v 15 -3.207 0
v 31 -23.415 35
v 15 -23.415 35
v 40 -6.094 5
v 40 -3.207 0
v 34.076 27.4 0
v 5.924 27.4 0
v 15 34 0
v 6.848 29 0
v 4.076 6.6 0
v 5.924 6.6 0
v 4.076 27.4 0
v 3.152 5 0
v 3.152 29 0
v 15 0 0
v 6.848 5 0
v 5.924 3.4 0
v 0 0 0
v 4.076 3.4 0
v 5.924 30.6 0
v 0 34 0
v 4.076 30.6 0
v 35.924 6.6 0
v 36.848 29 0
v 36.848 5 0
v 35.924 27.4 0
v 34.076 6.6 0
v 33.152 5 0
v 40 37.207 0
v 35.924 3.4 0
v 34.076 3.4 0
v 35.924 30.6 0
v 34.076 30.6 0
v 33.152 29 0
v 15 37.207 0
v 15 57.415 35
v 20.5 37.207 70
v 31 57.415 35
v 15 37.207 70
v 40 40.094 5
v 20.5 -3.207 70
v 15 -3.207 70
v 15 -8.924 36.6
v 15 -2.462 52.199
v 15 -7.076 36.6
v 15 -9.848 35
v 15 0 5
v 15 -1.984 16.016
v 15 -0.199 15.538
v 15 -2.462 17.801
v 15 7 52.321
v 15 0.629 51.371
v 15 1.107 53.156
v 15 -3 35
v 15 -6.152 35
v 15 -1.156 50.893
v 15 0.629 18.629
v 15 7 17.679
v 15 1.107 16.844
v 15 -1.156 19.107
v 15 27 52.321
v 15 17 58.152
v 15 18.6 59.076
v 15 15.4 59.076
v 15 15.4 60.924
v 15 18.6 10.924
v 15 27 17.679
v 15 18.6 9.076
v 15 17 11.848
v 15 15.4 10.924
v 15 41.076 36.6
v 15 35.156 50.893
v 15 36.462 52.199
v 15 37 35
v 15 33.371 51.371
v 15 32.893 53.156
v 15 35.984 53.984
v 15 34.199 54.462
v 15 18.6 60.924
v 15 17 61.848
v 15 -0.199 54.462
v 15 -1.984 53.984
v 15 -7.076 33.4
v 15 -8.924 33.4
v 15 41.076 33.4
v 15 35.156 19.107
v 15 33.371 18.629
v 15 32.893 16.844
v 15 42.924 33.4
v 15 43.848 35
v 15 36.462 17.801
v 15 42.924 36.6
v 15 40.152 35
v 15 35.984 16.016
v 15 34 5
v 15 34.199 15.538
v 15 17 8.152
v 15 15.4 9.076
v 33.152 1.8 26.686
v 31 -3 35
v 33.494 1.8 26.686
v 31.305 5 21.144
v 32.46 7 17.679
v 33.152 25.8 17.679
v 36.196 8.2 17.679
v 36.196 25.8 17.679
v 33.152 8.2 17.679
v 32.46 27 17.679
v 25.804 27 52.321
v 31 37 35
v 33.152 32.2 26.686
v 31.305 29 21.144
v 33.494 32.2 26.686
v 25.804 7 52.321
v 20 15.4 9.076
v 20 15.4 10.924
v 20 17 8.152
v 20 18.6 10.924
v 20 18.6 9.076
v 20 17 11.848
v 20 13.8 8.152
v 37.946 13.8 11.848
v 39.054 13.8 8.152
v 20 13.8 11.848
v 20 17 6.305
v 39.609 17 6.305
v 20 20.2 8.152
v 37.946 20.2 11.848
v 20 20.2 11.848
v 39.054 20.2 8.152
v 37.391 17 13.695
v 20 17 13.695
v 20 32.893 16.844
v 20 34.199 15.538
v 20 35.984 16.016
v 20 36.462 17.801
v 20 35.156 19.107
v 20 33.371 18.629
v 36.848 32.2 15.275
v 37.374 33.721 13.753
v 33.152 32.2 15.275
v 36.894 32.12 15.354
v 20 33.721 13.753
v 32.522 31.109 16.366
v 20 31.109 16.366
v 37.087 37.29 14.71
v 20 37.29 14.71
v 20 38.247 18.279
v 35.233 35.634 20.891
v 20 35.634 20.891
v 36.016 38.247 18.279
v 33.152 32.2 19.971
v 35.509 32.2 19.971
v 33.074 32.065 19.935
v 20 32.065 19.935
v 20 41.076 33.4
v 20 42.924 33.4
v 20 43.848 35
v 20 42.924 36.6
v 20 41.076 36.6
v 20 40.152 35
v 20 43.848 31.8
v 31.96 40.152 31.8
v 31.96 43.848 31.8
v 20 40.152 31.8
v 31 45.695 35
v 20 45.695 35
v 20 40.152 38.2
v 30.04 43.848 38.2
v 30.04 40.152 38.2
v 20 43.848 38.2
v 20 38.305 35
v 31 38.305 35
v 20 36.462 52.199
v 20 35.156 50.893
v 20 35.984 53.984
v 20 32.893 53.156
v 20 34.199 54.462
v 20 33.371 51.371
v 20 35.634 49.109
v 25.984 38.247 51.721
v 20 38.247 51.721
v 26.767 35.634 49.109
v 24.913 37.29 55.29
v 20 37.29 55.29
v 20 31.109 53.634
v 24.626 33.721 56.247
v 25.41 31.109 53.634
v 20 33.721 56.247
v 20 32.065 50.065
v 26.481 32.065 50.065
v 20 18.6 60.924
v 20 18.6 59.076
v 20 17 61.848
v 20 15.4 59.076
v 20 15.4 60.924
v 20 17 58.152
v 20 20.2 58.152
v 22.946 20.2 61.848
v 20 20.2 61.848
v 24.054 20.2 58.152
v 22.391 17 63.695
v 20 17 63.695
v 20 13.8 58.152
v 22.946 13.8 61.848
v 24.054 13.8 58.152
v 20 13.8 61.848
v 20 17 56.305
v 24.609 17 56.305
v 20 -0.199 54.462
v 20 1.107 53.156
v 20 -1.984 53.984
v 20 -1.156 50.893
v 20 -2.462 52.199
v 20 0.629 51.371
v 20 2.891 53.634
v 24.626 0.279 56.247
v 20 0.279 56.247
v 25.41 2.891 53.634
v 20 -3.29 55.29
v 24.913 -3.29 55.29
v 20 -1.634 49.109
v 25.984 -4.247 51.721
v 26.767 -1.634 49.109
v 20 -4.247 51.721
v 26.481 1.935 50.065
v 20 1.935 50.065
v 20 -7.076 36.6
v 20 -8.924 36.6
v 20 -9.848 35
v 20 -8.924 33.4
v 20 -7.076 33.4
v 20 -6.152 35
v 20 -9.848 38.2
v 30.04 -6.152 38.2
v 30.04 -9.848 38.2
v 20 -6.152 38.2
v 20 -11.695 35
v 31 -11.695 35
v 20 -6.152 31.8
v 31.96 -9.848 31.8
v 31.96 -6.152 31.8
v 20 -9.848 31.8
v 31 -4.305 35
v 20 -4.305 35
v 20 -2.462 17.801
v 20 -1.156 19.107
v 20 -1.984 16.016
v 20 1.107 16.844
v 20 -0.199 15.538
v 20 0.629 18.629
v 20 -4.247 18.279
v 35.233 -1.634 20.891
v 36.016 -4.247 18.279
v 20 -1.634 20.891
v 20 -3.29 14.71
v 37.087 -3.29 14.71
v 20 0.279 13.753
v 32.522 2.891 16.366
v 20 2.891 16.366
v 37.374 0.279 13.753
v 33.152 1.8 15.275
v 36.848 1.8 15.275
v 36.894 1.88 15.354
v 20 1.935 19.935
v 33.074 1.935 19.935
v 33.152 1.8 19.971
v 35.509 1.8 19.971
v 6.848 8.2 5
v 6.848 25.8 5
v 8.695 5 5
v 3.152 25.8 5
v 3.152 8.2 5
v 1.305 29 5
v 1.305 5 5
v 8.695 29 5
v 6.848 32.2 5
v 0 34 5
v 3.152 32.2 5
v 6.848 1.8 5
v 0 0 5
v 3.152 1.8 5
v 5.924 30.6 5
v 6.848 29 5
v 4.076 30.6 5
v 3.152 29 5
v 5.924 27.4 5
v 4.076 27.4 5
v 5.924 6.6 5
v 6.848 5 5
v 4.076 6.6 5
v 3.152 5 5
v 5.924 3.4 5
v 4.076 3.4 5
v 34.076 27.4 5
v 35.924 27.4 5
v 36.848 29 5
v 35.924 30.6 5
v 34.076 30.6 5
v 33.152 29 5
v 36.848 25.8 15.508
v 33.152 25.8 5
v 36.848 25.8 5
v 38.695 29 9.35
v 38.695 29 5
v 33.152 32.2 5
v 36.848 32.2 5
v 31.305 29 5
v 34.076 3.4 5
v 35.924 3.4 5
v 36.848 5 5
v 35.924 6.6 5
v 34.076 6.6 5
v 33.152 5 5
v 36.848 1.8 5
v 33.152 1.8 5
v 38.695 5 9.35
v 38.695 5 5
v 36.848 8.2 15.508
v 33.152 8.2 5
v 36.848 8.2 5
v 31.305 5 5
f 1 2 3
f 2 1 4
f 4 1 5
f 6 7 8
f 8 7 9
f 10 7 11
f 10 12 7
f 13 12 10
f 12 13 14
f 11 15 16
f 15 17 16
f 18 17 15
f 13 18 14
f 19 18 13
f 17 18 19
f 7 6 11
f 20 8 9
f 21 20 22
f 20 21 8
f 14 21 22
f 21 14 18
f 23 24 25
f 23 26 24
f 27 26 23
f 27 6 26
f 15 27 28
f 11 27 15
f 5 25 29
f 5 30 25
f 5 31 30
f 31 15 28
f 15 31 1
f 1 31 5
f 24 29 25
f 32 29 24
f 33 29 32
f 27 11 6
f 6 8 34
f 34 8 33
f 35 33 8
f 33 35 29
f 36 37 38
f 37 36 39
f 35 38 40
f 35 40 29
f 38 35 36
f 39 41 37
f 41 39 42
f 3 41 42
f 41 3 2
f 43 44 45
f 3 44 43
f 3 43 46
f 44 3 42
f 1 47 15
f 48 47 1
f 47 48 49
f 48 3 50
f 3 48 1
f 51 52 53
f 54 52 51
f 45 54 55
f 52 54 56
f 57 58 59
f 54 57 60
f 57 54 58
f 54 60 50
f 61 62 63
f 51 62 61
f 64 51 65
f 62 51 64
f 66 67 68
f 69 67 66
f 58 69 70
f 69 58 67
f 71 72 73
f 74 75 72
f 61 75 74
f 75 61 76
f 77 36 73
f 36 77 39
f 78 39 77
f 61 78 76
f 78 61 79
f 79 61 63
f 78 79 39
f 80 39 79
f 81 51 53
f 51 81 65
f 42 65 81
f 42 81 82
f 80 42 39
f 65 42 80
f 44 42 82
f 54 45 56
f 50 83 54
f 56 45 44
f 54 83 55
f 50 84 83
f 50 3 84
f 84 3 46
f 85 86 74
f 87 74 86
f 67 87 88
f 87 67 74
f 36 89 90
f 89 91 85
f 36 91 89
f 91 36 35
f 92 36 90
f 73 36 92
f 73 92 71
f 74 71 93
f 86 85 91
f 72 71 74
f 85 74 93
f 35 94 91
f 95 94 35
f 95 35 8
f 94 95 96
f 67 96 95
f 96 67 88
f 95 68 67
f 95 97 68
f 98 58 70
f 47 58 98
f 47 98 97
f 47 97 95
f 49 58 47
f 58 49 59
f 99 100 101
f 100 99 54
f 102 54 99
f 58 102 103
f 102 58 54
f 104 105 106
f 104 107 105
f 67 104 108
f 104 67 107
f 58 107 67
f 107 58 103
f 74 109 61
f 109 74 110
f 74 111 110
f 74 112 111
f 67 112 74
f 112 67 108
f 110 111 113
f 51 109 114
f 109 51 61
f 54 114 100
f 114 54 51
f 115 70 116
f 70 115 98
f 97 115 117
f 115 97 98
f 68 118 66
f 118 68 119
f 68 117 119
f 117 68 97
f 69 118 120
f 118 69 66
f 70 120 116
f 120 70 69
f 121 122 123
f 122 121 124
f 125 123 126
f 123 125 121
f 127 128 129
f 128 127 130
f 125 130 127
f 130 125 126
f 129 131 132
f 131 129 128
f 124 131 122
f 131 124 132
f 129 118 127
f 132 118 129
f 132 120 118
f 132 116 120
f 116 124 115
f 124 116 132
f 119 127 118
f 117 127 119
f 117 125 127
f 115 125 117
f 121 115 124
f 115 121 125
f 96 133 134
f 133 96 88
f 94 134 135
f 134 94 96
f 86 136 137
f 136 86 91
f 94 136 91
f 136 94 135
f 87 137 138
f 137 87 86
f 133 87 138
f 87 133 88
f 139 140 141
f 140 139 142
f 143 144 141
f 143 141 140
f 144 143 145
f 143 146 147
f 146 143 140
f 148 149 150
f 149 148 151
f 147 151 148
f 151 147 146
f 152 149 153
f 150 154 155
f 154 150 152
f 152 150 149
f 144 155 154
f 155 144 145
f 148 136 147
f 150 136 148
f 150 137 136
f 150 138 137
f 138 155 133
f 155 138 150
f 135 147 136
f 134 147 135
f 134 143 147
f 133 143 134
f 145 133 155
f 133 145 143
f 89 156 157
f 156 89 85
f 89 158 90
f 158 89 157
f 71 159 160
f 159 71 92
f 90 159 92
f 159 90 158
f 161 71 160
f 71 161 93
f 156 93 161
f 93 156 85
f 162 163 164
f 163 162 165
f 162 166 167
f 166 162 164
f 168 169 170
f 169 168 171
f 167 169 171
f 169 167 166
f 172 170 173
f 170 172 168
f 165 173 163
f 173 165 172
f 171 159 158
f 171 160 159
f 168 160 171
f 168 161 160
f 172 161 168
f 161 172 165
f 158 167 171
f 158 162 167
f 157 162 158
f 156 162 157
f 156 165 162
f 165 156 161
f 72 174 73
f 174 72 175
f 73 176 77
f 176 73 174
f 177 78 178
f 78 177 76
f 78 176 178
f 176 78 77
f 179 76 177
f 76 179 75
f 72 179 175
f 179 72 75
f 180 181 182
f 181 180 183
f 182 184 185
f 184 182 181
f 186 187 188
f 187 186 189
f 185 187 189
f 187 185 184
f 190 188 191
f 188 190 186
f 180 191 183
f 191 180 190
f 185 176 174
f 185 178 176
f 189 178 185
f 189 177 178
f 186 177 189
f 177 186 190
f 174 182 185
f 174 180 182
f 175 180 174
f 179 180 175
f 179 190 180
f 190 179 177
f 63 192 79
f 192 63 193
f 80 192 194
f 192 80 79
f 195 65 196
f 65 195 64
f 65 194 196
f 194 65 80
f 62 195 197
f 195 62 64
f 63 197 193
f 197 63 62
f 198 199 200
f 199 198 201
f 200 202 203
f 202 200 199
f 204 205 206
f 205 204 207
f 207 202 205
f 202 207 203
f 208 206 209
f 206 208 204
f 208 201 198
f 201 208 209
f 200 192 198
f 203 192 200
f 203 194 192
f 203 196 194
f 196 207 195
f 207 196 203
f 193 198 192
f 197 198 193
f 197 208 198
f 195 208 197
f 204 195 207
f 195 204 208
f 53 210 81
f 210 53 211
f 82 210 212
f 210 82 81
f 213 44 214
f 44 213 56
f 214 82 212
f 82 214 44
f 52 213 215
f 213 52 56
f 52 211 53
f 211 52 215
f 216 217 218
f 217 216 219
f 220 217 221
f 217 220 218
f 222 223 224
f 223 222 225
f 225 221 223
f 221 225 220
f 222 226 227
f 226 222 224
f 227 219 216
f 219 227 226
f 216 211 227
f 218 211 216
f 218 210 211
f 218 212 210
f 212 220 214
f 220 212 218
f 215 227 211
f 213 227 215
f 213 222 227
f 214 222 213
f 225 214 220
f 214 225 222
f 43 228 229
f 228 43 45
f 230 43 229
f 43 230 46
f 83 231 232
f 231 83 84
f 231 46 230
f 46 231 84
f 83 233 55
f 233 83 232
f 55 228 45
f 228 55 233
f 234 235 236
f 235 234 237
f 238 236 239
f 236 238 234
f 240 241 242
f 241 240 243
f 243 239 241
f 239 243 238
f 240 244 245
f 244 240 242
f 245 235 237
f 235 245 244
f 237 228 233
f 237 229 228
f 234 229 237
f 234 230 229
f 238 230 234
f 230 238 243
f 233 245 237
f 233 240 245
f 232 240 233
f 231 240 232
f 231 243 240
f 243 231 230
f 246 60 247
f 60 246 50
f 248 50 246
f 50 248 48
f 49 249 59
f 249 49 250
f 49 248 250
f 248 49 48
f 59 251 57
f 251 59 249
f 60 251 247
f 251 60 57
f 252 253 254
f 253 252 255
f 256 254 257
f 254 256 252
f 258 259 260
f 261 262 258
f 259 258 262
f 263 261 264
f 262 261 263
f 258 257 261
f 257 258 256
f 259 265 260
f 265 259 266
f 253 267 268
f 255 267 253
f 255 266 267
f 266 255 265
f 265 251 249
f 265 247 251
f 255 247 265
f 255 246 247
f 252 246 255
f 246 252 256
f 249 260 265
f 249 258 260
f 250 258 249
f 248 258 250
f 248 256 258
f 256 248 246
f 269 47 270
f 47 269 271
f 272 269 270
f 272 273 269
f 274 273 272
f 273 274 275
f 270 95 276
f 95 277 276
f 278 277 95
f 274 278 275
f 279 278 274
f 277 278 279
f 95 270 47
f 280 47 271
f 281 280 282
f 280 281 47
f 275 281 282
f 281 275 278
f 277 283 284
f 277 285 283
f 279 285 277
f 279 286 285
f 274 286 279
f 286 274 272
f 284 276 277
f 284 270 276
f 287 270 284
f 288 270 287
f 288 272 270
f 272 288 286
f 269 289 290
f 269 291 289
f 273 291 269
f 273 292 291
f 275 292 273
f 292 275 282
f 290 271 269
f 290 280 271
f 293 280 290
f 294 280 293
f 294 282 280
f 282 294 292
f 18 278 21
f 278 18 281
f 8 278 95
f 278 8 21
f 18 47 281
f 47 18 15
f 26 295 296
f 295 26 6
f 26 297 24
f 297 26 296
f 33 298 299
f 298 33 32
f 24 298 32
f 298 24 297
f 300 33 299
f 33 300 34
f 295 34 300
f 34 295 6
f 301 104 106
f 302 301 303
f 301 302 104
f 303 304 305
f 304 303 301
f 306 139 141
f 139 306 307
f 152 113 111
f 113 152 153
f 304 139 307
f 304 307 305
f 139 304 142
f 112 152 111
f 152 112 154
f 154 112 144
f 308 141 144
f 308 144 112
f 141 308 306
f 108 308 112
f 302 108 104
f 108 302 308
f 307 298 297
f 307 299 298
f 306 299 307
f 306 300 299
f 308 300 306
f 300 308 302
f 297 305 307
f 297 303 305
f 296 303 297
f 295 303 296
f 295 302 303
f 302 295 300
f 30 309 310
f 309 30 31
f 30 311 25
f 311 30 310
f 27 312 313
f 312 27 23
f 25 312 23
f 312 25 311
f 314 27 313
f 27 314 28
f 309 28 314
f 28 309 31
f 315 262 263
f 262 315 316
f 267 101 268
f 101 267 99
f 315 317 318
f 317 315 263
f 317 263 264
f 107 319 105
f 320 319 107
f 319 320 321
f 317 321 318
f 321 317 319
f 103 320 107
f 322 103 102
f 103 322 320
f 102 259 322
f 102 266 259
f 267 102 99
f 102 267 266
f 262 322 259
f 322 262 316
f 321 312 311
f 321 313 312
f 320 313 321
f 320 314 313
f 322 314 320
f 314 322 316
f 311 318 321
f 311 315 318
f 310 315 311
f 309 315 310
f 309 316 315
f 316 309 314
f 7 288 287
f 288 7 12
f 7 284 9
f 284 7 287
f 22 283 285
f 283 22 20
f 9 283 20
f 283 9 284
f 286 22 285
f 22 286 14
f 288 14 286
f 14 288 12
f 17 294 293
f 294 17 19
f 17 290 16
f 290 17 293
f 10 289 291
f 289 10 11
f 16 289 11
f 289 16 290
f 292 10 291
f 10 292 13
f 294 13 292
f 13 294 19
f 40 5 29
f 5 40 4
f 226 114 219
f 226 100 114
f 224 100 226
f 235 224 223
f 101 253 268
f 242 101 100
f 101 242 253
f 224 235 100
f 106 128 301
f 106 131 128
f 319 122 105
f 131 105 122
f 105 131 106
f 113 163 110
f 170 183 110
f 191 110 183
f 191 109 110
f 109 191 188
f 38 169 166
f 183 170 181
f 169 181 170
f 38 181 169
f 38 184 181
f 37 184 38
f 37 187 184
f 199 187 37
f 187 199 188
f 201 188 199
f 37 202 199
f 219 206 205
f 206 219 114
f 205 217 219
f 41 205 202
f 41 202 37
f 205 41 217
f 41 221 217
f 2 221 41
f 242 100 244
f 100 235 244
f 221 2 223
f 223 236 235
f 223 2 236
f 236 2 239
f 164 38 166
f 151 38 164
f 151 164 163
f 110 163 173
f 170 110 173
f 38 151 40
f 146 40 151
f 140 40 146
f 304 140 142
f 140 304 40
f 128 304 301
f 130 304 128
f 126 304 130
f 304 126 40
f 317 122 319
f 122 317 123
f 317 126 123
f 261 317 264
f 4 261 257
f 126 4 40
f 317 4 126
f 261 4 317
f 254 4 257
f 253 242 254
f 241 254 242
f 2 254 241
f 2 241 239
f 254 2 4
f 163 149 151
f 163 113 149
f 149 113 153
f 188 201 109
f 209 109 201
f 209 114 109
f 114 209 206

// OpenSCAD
// file: vars.scad
huge=500;

printer_w = 400;
printer_l = 400;
printer_h = 400;

bearing_w = 7;
bearing_d = 22;
bearing_r = bearing_d/2;
bearing_hole_d = 8;
bearing_hole_r = bearing_hole_d/2;


misc_bolt_d = 3.2;
misc_bolt_r = misc_bolt_d/2;
misc_nut_r  = misc_bolt_d;
misc_bolt_pitch = 0.5;
misc_bolthead_d = misc_bolt_d*2;
misc_bolthead_r = misc_bolthead_d/2;

retainer_shell_thick = 0.5;
retainer_shell_sep   = 0.25;
//retainer_lip_thick   = 1;
retainer_lip_thick   = 2;
retainer_inner_width = 1;

belt_w    = 6;
belt_thick= 2;
belt_sep  = retainer_lip_thick*2 + 2;

calc_retainer_h  = retainer_lip_thick*2 + belt_w;
calc_retainer_ir = bearing_r + retainer_shell_thick*2 + retainer_shell_sep;
calc_retainer_or = calc_retainer_ir + belt_thick;
calc_retainer_b_off = retainer_lip_thick - (bearing_w-belt_w)/2;

tslot_w = 20;
tslot_bolt_d = 5;
tslot_bolt_r = tslot_bolt_d/2;
tslot_bolt_l = 4;
tslot_bolthead_d = 10;
tslot_bolthead_r = tslot_bolthead_d/2;


corner_thick = 5;
corner_length = tslot_w*3;

rod_d=8;
rod_r=rod_d/2;

bushing_d=16;
bushing_r=bushing_d/2;
bushing_l=10;
bushing_flange_r = bushing_r+3;
bushing_flange_w = 1;
bushing_material_thick = 5;

x_rod_sep = 30;
x_carriage_l = 40;
x_mount_sep_x = x_carriage_l - misc_bolthead_r*2*2 - misc_bolt_r*2;
x_mount_offset = bushing_r + misc_bolt_r * 2;
belt_above_x = 30;
belt_clamp_w = 7;
x_rod_past_bearing = 20;

bearing_mount_base = corner_thick;
bearing_mount_extra = 2;
belt_above_bearing_mount = bearing_mount_base + bearing_mount_extra + retainer_lip_thick;
bearing_mount_support_tweak = 30;

y_bearing_offset = bushing_r+bushing_material_thick-calc_retainer_ir;

y_bearing_sep_y = calc_retainer_ir*2+belt_thick;
y_bearing_sep_z = belt_w+belt_sep;
bearing_bolt_r  = 4;
bearing_bolt_pitch = 1.25;
bearing_bolt_holder_thick = 4;
y_carriage_from_tslot = 2;

motor_w = 42.3;
motor_h = motor_w;
motor_bolt_sep = 31.0;
motor_bolt_r   = 1.5;
motor_pulley_d = 10;
motor_pulley_r = motor_pulley_d/2;
motor_pulley_h = 5.3;
motor_flange_d = 23;
motor_flange_r = motor_flange_d/2;
motor_corner_extra_hole_pos = tslot_bolt_r+3;

calc_corner_from_y_rod = x_rod_past_bearing+corner_thick+y_carriage_from_tslot+tslot_w;
calc_corner_above_x = belt_above_x - belt_above_bearing_mount + bearing_mount_base;

calc_motor1_above_x  = belt_above_x - motor_pulley_h;
calc_motor2_above_x  = belt_above_x - motor_pulley_h + belt_w + belt_sep;
calc_motor_from_y_rod = -bushing_r - bushing_material_thick + bearing_bolt_holder_thick + bearing_bolt_r + calc_retainer_or + motor_pulley_r;

motor_bracket_thick = 12;
motor_bracket_wide = (motor_w - motor_flange_d) / 2;
motor_bracket_len  = motor_w;
motor_bolt_offset  = (motor_w - motor_bolt_sep) / 2;

z_rod_sep = 150;
z_motor_off = motor_h - tslot_w - corner_thick;

laser_mat_thick = 4.75;
laser_mat_margin = laser_mat_thick;
bed_mount_sep   = 209;
bed_from_z      = 60;
bed_box_r       = 25;
bed_box_h       = 50;
platform_l      =  laser_mat_margin + laser_mat_thick + bed_box_r + bed_from_z + bed_mount_sep + misc_bolt_r + laser_mat_margin;
platform_w      = bed_mount_sep + misc_bolt_r*2 + laser_mat_margin*2;
z_leadscrew_passthrough_r = 12/2;
leadscrew_bolt_offset = 22/2;
leadscrew_bolt_r = 3.2/2;
laser_bushing_fudge = 0.1;

lm8uu_d=15;
lm8uu_r=lm8uu_d/2;
lm8uu_bolt_r=5/2;
lm8uu_nut_r=10/2;
// file: common.scad
include <vars.scad>

// Reduce radius of holes intended to hold bolts by threads.
// 0.86603 * p = nominal depth of threads.  1/3-1/2 of that is about right.
function smallhole(r,p) = r - ((p*0.86603)/3);
module polyhole(r,h,v=6,a=0)
{
  rotate([0,0,a]) cylinder( h = h, r = r  / cos( 180 / v ), $fn = v );
}
module polycircle(r,v=6,a=0)
{
  rotate([0,0,a]) circle(r = r  / cos( 180 / v ), $fn = v );
}

module bolt(bolt_r = misc_bolt_r,bolthead_r = misc_bolthead_r,bolt_len = huge,v=6,a=0)
{
  translate([0,0,-bolt_len]) polyhole(r=bolt_r,h=bolt_len+1,v=v,a=a);
  polyhole(r=bolthead_r,h=huge,v=v,a=a);
}

module ring(inner=5,outer=10,v=32)
{
  difference()
  {
    circle(r=outer);
    polycircle(r=inner,v=v);
  }
} 

module roundsquare(dim=[50,50],r=5)
{
  translate([0,r]) square([dim[0], dim[1] - r*2]);
  translate([r,0]) square([dim[0] - r*2, dim[1]]);
  for(x=[r,dim[0]-r])
  for(y=[r,dim[1]-r])
    translate([x,y]) circle(r=r);
}

module maketabs(l=100,w=5,num=10)
{
  tablength=l/(num * 2);
  for(x=[tablength/2:tablength*2:l])
    translate([x,0]) square([tablength,w]);
}
// main file
include <common.scad>

extruder_standard();

module mount()
{
  difference()
  {
    difference()
    {
      polyhole(r=25+corner_thick*2,h=huge,a=360/12);
      translate([0,0,-1]) rotate([0,0,360/12]) cylinder(r=25-corner_thick,h=huge,$fn=6);
      //ring(outer=25+corner_thick*2,inner=25-corner_thick,$fn=6);
    }

    for(a=[0:45:360])
      rotate([0,0,a]) translate([25,0,corner_thick])  bolt(bolt_r=misc_bolt_r,bolthead_r=misc_bolthead_r);
  }

}

module extruder_standard()
{
  difference()
  {
    union()
    {
      cube([x_rod_sep + corner_thick*2,x_mount_sep_x+corner_thick*2,corner_thick]);
      translate([x_rod_sep/2,x_mount_sep_x/2+corner_thick,25+corner_thick*2]) rotate([0,90,0]) mount();
    }

    translate([x_rod_sep/2+corner_thick,x_mount_sep_x/2+corner_thick,0])
    {
      for(x=[x_rod_sep/2,-x_rod_sep/2])
      for(y=[x_mount_sep_x/2,-x_mount_sep_x/2])
        translate([x,y,corner_thick]) bolt(bolt_r=misc_bolt_r,bolthead_r=misc_bolthead_r);
    }

    translate([x_rod_sep+corner_thick*2,-huge/2,-1]) cube([huge,huge,huge]);
    translate([x_rod_sep+corner_thick*2,-huge/2,corner_thick]) rotate([0,-atan((x_rod_sep/2)/50),0]) cube([huge,huge,huge]);
  }
}
